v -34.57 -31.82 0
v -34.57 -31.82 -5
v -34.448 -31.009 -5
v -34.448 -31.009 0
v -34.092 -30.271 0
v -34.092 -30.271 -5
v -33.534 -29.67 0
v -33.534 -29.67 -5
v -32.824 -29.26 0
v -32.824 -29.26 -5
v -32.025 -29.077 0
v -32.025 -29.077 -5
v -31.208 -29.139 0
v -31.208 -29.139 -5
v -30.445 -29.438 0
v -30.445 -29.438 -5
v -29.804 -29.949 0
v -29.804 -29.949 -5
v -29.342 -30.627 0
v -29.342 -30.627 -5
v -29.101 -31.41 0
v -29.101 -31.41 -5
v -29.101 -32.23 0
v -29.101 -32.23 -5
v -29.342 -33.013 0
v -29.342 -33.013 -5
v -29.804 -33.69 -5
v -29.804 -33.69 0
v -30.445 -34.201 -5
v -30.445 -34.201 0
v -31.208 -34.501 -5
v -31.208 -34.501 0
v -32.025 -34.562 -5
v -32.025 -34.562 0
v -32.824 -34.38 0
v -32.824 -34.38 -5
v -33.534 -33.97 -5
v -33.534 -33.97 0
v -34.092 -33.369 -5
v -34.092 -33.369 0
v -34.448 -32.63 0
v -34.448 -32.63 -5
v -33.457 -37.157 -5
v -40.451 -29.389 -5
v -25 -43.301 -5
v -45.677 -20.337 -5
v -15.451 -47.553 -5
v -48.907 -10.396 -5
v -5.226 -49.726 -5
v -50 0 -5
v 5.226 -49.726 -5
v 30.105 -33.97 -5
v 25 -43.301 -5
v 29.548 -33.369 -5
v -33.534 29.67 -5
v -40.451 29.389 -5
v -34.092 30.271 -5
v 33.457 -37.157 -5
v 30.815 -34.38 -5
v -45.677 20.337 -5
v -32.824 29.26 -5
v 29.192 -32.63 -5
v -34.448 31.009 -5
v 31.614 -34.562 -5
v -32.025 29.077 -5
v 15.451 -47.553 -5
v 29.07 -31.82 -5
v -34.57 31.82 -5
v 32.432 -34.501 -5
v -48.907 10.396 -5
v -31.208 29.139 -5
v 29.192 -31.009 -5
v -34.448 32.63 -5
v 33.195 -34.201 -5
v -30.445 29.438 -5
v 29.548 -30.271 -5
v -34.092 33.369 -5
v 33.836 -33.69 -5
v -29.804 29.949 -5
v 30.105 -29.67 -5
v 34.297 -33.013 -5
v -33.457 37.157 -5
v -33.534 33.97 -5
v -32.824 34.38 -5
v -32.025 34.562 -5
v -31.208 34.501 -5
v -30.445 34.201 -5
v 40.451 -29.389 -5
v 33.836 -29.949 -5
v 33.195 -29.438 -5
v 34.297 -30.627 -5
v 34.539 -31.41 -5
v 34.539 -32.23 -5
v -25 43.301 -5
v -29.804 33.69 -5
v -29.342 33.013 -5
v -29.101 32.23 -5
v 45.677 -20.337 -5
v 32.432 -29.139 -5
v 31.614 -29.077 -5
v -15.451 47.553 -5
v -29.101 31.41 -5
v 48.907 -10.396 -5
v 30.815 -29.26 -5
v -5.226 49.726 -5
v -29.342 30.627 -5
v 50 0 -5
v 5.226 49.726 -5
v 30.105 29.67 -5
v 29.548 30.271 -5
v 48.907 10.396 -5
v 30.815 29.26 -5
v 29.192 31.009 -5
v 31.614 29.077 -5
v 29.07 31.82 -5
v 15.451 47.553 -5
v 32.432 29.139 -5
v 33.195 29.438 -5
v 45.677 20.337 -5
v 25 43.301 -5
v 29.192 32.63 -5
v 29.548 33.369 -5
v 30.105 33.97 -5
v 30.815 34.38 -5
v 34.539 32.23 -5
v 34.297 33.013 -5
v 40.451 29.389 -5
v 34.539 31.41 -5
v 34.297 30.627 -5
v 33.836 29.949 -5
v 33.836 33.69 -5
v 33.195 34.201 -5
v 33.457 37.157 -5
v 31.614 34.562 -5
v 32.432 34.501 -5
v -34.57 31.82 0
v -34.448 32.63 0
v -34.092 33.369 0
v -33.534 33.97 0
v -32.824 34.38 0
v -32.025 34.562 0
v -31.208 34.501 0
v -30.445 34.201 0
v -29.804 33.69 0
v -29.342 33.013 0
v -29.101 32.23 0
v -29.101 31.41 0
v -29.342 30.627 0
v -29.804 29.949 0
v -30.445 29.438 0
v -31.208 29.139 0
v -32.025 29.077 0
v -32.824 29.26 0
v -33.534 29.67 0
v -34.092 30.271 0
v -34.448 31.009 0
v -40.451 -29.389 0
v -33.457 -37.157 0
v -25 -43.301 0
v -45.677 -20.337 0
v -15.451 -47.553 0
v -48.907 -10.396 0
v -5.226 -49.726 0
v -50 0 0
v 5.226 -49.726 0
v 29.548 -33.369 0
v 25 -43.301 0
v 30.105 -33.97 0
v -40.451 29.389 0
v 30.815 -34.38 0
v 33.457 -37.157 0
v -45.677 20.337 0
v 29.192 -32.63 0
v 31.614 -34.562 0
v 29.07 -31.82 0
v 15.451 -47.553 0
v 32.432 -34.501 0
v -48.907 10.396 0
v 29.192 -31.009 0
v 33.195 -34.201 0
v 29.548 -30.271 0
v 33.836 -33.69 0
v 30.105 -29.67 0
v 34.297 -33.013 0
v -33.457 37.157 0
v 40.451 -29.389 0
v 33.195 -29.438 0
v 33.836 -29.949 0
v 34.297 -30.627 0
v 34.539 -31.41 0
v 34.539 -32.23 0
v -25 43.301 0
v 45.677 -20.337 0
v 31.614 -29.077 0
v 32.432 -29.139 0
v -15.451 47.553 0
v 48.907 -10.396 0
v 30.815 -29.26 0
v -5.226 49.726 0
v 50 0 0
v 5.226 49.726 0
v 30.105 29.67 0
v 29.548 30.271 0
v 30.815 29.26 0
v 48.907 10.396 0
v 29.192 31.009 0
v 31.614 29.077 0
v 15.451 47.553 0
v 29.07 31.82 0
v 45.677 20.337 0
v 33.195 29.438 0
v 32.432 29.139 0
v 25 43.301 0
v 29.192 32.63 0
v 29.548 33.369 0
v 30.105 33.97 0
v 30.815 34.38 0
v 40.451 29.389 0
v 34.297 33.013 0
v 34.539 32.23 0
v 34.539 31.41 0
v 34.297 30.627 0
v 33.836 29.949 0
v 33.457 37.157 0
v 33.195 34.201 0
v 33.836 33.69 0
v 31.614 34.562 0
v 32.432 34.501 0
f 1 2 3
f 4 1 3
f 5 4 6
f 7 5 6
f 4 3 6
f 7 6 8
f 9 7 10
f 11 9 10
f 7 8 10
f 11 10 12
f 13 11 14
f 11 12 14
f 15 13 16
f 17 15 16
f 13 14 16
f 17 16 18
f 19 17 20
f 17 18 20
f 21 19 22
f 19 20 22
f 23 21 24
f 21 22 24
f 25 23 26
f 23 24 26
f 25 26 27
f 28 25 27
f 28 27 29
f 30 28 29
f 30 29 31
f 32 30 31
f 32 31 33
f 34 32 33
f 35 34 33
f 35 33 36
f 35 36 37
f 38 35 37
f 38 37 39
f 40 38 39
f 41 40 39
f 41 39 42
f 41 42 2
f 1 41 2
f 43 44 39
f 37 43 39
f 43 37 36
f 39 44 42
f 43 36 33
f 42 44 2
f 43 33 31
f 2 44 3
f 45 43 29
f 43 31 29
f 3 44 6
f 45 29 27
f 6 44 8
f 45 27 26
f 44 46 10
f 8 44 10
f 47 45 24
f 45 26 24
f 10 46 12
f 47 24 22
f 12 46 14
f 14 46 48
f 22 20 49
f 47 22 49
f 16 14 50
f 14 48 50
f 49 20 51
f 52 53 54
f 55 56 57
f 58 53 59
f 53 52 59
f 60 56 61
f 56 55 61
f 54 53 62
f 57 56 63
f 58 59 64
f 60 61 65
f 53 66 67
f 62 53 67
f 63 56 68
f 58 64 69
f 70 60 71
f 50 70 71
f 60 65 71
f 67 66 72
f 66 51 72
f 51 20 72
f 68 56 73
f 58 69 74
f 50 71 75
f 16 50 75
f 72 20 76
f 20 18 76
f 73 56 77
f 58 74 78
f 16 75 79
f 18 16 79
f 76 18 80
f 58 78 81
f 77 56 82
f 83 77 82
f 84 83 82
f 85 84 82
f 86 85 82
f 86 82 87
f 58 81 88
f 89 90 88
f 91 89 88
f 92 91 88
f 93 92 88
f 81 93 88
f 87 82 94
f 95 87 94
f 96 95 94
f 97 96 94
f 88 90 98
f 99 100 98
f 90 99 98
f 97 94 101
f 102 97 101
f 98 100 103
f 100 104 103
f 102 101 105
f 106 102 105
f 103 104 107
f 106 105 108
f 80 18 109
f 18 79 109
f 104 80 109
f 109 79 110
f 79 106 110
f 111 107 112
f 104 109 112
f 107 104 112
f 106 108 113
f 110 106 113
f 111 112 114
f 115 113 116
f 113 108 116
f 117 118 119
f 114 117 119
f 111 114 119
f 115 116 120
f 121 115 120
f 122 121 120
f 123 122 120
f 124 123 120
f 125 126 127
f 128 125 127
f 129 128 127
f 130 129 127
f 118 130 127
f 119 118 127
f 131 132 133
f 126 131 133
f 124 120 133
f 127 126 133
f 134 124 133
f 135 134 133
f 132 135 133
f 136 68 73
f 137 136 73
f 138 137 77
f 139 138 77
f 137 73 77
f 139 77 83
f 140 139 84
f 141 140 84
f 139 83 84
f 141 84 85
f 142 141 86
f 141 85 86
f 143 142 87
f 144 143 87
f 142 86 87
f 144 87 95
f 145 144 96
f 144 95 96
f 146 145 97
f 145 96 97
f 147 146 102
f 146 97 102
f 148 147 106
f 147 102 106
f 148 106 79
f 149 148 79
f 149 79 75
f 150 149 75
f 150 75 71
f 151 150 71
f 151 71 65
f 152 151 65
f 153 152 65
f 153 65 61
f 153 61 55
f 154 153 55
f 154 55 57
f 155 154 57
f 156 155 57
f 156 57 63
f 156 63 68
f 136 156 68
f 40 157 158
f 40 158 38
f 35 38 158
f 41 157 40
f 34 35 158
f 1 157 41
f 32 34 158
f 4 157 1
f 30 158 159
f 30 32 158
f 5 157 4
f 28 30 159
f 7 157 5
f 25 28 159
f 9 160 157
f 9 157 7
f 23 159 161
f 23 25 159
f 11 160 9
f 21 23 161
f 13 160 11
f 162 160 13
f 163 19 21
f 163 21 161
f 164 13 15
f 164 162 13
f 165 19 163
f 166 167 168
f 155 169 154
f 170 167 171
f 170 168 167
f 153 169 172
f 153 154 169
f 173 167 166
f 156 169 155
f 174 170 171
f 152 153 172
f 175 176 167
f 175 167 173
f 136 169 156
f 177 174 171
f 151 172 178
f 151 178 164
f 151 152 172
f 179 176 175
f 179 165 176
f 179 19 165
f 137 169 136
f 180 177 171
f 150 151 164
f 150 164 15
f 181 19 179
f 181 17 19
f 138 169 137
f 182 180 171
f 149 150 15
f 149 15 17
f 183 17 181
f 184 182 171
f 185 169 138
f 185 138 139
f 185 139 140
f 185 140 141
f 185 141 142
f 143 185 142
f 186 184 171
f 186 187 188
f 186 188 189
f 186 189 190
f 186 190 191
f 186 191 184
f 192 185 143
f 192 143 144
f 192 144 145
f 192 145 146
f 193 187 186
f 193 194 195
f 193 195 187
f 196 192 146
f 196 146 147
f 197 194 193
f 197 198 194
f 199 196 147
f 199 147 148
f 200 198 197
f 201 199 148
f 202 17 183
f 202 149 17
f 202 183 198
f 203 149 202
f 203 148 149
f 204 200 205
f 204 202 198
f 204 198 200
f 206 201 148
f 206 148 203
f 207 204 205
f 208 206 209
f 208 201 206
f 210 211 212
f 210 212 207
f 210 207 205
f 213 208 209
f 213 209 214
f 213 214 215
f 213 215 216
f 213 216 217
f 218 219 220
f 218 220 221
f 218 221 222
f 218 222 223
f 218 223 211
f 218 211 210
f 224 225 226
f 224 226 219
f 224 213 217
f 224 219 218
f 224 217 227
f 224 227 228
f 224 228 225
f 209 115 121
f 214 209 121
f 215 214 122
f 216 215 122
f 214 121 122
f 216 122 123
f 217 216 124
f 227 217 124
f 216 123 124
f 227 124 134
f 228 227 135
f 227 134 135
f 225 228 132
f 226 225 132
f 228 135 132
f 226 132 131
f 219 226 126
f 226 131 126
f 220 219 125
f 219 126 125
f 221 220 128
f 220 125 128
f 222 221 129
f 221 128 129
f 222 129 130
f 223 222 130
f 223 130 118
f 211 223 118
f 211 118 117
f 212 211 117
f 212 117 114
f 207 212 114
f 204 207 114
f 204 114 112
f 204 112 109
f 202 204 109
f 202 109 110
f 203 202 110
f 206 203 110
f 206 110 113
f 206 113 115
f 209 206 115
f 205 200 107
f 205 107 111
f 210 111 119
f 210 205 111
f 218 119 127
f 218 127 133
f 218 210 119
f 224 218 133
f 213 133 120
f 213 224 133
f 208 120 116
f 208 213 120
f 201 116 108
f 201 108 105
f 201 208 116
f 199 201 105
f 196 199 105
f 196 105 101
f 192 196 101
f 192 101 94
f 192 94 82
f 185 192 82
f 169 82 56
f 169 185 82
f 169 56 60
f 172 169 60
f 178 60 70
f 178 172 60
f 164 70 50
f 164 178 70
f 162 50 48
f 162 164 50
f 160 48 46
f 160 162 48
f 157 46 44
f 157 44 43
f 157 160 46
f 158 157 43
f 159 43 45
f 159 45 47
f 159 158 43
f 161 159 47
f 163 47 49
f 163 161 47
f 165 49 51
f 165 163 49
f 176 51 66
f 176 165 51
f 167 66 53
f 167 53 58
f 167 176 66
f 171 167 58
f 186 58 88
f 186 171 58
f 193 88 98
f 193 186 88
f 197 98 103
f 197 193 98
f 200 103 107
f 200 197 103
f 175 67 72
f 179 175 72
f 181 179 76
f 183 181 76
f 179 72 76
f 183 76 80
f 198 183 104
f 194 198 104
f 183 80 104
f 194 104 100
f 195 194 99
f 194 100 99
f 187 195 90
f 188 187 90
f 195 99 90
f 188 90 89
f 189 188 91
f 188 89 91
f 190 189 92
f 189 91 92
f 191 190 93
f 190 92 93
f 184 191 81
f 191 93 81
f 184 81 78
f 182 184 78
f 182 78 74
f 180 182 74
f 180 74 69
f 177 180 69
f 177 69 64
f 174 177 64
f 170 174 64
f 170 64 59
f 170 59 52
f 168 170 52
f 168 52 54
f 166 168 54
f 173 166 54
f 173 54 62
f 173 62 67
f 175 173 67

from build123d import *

# Parameters (mm, degrees)
SKETCH1_R                 = 50
EXTRUDE1_DEPTH            = 5
M5_5_5_5_DIAMETER_HOLE2_D = 5.5


with BuildPart() as part:
    # Sketch1 → Extrude1 (new body)
    with BuildSketch(Plane.XY):
        Circle(SKETCH1_R)
    extrude(amount=-EXTRUDE1_DEPTH)

    # M5.5 (5.5) Diameter Hole2 (through all)
    with Locations(Plane.XY):
        with Locations((-31.819805153, 31.819805153), (31.819805153, 31.819805153), (31.819805153, -31.819805153), (-31.819805153, -31.819805153)):
            Hole(M5_5_5_5_DIAMETER_HOLE2_D / 2)


solid = part.part
